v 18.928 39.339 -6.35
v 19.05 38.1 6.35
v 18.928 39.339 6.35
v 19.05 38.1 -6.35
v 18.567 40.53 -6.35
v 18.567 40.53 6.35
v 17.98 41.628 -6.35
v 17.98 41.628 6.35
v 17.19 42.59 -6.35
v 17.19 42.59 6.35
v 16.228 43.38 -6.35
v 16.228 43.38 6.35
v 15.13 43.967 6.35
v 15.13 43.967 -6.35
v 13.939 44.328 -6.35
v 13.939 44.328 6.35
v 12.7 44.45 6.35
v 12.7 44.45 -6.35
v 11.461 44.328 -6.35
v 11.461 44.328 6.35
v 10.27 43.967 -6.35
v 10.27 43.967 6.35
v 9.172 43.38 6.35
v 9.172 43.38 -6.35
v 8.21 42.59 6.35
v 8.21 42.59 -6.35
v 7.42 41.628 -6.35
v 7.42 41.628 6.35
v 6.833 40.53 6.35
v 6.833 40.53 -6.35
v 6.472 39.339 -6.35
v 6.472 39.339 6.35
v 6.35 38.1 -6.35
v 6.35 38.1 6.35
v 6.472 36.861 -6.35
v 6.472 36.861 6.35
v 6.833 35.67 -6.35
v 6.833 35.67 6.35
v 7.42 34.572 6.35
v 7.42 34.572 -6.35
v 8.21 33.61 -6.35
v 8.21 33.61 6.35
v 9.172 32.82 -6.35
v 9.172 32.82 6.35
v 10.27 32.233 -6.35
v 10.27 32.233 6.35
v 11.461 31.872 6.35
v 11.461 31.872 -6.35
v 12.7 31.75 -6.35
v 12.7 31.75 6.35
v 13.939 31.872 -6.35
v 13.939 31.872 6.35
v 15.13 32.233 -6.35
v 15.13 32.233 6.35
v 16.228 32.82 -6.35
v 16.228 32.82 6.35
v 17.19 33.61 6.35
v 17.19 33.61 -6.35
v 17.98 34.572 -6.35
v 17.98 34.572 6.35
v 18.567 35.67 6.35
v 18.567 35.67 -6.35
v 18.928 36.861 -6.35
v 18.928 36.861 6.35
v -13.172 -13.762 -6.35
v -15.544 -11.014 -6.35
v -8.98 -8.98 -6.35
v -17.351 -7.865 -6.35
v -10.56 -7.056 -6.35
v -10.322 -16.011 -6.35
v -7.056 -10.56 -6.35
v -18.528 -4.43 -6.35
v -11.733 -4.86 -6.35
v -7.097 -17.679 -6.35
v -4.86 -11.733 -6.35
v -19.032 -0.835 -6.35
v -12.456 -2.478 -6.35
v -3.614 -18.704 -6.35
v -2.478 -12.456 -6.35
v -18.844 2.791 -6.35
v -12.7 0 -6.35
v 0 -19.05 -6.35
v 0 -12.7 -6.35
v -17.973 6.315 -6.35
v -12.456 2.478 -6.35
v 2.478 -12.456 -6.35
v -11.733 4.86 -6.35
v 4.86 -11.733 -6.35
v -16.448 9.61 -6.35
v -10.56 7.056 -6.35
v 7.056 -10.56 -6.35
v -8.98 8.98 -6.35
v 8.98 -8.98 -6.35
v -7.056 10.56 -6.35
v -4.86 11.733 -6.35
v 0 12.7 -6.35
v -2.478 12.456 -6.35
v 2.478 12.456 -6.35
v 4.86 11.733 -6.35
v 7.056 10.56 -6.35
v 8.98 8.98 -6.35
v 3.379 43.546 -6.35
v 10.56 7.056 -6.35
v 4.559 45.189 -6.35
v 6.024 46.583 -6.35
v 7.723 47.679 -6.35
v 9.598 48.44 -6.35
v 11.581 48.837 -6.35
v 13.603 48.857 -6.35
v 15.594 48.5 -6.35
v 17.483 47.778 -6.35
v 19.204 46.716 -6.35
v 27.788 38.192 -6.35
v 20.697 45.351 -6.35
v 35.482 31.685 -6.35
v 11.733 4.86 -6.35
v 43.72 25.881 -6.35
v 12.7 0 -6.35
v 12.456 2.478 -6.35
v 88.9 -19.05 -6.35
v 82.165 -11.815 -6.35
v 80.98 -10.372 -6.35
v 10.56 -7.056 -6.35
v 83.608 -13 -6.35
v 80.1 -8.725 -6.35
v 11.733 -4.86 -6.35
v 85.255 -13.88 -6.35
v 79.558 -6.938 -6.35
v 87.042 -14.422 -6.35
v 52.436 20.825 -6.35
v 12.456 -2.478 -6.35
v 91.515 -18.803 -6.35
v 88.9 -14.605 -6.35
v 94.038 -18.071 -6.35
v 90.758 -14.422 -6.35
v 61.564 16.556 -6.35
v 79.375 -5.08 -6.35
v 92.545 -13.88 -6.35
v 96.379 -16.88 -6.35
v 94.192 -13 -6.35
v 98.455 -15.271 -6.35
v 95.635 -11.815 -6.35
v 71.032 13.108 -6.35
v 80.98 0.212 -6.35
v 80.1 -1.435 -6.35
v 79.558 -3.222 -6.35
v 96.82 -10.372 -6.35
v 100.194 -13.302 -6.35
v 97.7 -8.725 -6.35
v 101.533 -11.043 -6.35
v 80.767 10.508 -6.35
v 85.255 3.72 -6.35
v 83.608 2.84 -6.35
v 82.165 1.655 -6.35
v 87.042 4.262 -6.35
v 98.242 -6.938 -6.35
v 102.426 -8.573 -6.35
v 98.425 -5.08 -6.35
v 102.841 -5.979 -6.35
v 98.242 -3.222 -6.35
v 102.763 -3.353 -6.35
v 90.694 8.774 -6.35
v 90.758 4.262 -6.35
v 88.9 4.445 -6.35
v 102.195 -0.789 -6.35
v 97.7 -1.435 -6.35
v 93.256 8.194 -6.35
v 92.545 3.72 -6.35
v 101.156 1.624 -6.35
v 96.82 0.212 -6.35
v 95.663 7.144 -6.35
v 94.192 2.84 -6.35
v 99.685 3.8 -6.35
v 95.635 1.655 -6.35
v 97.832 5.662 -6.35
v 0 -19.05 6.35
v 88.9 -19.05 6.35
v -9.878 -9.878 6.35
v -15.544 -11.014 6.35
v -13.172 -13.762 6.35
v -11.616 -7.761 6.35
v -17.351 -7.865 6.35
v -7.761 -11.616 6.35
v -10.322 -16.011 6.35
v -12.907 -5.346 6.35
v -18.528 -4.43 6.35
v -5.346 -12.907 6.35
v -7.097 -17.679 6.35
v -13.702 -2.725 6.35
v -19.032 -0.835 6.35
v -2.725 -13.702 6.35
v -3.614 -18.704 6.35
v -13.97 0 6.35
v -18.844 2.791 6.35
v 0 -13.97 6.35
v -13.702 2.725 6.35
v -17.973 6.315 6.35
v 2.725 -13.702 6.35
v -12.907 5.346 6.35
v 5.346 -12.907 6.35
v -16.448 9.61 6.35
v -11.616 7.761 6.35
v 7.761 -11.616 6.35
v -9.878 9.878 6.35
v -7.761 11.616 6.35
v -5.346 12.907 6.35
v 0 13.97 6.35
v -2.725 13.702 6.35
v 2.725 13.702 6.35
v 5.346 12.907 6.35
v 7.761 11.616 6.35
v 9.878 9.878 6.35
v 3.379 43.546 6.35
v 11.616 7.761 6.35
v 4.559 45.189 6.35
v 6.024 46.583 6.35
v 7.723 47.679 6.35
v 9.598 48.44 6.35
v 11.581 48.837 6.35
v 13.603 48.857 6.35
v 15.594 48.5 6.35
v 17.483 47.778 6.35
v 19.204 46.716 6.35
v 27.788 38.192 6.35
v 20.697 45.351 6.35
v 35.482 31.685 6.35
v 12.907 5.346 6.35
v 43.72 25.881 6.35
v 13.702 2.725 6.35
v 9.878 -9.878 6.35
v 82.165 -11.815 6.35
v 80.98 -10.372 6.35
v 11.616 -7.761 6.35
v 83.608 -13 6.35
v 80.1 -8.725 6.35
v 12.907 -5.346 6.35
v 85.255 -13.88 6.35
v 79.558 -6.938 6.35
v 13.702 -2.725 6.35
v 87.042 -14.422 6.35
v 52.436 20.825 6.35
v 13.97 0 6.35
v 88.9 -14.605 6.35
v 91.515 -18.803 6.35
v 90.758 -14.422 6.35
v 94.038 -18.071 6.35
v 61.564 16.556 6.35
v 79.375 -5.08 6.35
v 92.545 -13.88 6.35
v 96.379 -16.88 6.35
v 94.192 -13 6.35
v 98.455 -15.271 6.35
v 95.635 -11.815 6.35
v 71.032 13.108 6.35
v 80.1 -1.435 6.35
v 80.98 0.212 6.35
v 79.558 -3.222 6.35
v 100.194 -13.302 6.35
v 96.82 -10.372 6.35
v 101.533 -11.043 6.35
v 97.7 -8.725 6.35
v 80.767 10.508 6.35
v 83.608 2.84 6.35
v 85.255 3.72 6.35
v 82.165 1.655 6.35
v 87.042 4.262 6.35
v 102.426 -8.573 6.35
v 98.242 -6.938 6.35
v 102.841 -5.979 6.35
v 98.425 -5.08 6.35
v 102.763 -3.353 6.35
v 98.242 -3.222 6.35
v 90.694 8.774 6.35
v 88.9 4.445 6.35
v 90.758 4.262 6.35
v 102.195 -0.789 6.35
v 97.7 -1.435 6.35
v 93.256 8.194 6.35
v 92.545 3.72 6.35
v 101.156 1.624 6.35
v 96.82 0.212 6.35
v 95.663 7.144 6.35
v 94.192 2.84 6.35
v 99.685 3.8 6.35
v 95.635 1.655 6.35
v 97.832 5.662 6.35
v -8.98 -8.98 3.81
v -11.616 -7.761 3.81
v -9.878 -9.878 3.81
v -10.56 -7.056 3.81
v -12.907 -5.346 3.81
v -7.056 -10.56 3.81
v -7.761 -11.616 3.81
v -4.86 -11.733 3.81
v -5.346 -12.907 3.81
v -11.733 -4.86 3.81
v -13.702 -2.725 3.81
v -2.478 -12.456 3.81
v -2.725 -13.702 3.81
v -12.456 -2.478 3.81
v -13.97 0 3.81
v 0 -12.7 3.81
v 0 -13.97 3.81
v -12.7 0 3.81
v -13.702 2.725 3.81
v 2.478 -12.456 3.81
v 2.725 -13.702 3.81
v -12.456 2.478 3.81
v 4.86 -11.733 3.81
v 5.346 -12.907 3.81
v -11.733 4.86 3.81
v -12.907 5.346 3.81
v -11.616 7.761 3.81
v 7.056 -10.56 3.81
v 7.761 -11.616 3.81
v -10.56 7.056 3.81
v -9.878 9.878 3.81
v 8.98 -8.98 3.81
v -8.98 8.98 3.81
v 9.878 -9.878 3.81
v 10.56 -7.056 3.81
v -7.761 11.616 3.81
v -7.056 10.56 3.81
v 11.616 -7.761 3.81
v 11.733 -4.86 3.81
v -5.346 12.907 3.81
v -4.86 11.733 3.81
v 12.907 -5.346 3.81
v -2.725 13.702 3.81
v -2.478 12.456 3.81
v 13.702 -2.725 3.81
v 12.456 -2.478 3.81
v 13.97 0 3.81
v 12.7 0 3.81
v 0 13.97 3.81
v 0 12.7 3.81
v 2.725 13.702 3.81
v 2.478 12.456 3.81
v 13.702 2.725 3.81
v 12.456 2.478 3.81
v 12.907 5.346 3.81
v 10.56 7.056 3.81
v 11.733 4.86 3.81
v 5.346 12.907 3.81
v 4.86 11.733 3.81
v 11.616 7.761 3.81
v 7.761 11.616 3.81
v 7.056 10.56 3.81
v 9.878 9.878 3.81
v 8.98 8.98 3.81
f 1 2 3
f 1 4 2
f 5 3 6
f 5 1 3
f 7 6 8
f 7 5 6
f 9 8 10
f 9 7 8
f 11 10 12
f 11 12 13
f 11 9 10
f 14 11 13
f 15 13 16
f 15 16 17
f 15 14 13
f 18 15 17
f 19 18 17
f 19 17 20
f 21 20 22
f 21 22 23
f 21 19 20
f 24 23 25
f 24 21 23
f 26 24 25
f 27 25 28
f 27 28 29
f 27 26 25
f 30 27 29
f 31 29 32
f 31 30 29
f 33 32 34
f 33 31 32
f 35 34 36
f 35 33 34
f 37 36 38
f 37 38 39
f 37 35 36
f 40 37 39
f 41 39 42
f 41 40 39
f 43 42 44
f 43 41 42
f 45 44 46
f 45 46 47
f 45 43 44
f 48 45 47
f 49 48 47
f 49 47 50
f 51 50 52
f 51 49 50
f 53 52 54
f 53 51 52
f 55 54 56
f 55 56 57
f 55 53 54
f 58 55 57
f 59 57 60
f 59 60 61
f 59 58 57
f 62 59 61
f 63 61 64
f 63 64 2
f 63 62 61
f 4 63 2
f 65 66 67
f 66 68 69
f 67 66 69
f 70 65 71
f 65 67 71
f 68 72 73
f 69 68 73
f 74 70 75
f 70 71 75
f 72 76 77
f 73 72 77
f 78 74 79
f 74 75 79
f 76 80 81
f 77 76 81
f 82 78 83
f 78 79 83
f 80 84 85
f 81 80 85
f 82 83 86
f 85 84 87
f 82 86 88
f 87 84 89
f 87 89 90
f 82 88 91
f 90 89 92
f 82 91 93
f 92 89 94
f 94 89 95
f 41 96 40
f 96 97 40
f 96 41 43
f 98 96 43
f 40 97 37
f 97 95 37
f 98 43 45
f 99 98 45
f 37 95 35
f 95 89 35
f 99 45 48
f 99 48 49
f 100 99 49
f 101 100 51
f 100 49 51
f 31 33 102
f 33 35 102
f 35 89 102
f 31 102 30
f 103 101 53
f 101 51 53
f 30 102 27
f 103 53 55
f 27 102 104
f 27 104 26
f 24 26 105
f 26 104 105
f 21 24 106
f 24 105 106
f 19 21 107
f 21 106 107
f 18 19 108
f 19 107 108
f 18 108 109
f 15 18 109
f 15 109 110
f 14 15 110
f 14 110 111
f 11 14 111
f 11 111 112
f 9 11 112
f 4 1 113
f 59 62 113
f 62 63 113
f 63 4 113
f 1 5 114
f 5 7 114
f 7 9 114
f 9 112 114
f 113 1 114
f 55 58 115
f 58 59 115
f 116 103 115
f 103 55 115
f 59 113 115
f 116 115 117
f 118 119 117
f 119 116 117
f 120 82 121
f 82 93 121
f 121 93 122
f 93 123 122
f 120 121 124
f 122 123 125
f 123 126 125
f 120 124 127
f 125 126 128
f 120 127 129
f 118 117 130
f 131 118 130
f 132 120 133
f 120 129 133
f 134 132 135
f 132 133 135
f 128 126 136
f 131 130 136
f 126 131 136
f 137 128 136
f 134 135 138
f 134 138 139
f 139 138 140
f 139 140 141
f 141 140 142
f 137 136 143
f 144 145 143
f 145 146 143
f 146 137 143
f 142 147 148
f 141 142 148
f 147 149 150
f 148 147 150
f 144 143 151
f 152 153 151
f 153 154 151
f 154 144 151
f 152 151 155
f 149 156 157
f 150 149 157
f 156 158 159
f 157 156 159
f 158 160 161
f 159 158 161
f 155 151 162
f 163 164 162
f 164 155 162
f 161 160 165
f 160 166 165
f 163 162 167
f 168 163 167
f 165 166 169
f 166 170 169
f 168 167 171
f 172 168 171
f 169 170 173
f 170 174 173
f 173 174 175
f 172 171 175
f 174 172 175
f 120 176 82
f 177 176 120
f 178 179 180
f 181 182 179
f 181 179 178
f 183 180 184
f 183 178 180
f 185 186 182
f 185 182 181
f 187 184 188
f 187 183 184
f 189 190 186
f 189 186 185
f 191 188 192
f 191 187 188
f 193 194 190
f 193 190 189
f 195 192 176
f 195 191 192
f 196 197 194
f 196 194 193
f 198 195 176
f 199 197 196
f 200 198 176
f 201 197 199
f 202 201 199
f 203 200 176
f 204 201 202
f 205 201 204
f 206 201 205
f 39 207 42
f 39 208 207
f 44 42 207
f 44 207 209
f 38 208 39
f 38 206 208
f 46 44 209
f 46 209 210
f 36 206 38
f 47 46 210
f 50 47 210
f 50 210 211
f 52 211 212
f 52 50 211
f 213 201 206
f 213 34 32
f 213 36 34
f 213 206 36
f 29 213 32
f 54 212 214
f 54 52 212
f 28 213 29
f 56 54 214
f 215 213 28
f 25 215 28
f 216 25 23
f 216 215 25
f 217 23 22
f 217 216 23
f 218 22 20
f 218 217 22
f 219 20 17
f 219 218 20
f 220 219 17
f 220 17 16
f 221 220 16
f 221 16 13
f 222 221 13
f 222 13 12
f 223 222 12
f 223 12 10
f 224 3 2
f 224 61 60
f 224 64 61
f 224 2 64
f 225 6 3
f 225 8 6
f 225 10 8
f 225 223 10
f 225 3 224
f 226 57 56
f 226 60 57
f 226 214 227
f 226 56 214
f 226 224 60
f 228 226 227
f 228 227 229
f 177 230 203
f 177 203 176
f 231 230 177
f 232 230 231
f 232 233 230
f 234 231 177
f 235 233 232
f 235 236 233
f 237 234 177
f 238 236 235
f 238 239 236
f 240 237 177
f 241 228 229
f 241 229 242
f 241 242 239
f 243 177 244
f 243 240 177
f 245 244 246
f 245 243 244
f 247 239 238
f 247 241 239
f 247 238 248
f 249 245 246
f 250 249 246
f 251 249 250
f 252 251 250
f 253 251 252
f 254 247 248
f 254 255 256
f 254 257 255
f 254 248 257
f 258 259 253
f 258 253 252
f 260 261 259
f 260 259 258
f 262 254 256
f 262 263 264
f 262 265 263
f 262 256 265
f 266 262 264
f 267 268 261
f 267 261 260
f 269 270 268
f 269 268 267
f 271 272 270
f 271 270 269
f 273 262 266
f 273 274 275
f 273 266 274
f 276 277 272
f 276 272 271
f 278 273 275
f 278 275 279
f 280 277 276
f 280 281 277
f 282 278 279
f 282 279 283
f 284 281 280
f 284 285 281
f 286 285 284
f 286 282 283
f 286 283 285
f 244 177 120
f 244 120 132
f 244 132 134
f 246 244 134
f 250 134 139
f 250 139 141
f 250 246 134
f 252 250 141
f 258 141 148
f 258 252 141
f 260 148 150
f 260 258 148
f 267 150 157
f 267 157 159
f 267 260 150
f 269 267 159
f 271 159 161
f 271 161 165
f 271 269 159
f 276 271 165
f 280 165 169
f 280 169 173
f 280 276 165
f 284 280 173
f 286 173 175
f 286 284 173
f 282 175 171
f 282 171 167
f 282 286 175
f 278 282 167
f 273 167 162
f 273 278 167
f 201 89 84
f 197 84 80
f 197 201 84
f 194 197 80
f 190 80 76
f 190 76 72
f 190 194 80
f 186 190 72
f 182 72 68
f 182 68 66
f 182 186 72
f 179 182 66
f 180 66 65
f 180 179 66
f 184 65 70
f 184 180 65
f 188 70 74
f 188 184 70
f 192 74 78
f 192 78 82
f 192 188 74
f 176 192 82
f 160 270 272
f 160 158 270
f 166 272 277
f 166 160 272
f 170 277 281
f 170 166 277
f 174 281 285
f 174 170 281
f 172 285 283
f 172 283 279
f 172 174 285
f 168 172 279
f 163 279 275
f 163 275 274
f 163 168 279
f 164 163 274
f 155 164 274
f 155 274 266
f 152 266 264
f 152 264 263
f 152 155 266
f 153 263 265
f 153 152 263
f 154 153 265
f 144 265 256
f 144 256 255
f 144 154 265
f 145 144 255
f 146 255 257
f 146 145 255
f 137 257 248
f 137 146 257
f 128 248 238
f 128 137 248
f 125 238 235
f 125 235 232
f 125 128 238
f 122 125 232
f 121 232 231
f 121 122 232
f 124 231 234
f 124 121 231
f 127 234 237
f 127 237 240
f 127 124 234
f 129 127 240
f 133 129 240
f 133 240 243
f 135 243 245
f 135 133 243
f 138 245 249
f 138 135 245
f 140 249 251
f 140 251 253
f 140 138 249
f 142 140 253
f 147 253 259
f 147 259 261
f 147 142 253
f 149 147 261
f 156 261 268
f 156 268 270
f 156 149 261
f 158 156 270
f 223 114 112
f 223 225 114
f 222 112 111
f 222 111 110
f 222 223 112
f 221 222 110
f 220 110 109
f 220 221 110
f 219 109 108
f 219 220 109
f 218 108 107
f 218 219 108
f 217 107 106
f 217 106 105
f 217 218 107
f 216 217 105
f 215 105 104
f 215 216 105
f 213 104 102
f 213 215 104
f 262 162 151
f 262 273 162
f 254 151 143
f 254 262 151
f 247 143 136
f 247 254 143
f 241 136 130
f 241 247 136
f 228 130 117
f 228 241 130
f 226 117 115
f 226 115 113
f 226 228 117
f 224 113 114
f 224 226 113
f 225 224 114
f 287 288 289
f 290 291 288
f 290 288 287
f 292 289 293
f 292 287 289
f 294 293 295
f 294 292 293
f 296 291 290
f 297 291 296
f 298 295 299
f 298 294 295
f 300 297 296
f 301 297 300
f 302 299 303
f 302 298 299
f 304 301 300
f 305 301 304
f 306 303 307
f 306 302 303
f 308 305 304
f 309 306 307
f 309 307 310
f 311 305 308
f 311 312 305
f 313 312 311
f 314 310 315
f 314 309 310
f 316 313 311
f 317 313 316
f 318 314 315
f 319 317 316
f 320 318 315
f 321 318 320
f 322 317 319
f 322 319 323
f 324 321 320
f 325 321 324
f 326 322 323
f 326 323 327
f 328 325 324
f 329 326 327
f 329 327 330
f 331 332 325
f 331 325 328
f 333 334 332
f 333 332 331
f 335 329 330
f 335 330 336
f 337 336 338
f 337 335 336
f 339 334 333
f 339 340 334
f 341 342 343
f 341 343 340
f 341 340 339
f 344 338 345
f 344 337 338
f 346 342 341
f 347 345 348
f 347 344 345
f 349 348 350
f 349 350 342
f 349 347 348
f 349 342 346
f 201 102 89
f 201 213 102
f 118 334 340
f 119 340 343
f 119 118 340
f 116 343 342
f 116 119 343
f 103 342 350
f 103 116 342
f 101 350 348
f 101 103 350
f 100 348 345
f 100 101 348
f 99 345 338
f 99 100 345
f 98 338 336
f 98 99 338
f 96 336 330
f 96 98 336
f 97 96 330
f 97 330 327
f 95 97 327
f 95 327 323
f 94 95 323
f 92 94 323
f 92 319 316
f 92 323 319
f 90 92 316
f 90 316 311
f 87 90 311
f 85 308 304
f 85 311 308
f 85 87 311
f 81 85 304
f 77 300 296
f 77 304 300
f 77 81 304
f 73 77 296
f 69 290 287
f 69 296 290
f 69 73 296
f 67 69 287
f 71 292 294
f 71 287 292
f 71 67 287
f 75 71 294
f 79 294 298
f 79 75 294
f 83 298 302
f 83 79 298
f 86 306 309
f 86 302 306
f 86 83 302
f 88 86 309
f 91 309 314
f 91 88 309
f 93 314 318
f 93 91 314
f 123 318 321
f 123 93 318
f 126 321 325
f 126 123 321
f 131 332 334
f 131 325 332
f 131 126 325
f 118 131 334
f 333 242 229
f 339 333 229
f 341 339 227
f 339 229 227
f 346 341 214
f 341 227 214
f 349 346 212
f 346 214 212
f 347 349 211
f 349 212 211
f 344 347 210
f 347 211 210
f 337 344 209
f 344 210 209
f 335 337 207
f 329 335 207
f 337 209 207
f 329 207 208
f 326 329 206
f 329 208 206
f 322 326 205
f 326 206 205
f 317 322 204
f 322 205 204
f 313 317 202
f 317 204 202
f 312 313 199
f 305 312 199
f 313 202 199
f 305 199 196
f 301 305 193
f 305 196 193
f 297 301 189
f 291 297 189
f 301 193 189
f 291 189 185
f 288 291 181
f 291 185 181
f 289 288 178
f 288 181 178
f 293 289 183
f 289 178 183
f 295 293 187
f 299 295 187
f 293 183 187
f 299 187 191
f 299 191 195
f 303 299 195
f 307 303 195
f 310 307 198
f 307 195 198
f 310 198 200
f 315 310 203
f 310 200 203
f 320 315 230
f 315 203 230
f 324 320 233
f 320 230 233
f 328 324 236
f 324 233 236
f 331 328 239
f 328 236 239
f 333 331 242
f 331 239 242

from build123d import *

# Parameters (mm, degrees)
F0_R     = 12.7
F0_R_2   = 9.525
F0_R_3   = 6.35
F1_DEPTH = 6.35
F2_R     = 13.97
F3_DEPTH = 2.54


with BuildPart() as f1:
    # F0 (on Top) → F1 (new body, symmetric)
    with BuildSketch(Plane.XY):
        with BuildLine():
            Line((3.379315, 43.545812), (-16.448267, 9.610256))
            ThreePointArc((-16.448267, 9.610256), (-16.522377, -9.482276), (0, -19.05))
            Line((0, -19.05), (88.9, -19.05))
            ThreePointArc((88.9, -19.05), (102.841054, -5.978839), (90.693954, 8.774336))
            ThreePointArc((90.693954, 8.774336), (52.435987, 20.825014), (20.697055, 45.351147))
            ThreePointArc((20.697055, 45.351147), (11.580711, 48.836816), (3.379315, 43.545812))
        make_face()
        Circle(F0_R, mode=Mode.SUBTRACT)
        with Locations((88.9, -5.08)):
            Circle(F0_R_2, mode=Mode.SUBTRACT)
        with Locations((12.7, 38.1)):
            Circle(F0_R_3, mode=Mode.SUBTRACT)
    extrude(amount=F1_DEPTH, both=True)

    # F2 (on face) → F3 (cut)
    with BuildSketch(Plane.XY.offset(6.35)):
        Circle(F2_R)
    extrude(amount=-F3_DEPTH, mode=Mode.SUBTRACT)


solid = f1.part
